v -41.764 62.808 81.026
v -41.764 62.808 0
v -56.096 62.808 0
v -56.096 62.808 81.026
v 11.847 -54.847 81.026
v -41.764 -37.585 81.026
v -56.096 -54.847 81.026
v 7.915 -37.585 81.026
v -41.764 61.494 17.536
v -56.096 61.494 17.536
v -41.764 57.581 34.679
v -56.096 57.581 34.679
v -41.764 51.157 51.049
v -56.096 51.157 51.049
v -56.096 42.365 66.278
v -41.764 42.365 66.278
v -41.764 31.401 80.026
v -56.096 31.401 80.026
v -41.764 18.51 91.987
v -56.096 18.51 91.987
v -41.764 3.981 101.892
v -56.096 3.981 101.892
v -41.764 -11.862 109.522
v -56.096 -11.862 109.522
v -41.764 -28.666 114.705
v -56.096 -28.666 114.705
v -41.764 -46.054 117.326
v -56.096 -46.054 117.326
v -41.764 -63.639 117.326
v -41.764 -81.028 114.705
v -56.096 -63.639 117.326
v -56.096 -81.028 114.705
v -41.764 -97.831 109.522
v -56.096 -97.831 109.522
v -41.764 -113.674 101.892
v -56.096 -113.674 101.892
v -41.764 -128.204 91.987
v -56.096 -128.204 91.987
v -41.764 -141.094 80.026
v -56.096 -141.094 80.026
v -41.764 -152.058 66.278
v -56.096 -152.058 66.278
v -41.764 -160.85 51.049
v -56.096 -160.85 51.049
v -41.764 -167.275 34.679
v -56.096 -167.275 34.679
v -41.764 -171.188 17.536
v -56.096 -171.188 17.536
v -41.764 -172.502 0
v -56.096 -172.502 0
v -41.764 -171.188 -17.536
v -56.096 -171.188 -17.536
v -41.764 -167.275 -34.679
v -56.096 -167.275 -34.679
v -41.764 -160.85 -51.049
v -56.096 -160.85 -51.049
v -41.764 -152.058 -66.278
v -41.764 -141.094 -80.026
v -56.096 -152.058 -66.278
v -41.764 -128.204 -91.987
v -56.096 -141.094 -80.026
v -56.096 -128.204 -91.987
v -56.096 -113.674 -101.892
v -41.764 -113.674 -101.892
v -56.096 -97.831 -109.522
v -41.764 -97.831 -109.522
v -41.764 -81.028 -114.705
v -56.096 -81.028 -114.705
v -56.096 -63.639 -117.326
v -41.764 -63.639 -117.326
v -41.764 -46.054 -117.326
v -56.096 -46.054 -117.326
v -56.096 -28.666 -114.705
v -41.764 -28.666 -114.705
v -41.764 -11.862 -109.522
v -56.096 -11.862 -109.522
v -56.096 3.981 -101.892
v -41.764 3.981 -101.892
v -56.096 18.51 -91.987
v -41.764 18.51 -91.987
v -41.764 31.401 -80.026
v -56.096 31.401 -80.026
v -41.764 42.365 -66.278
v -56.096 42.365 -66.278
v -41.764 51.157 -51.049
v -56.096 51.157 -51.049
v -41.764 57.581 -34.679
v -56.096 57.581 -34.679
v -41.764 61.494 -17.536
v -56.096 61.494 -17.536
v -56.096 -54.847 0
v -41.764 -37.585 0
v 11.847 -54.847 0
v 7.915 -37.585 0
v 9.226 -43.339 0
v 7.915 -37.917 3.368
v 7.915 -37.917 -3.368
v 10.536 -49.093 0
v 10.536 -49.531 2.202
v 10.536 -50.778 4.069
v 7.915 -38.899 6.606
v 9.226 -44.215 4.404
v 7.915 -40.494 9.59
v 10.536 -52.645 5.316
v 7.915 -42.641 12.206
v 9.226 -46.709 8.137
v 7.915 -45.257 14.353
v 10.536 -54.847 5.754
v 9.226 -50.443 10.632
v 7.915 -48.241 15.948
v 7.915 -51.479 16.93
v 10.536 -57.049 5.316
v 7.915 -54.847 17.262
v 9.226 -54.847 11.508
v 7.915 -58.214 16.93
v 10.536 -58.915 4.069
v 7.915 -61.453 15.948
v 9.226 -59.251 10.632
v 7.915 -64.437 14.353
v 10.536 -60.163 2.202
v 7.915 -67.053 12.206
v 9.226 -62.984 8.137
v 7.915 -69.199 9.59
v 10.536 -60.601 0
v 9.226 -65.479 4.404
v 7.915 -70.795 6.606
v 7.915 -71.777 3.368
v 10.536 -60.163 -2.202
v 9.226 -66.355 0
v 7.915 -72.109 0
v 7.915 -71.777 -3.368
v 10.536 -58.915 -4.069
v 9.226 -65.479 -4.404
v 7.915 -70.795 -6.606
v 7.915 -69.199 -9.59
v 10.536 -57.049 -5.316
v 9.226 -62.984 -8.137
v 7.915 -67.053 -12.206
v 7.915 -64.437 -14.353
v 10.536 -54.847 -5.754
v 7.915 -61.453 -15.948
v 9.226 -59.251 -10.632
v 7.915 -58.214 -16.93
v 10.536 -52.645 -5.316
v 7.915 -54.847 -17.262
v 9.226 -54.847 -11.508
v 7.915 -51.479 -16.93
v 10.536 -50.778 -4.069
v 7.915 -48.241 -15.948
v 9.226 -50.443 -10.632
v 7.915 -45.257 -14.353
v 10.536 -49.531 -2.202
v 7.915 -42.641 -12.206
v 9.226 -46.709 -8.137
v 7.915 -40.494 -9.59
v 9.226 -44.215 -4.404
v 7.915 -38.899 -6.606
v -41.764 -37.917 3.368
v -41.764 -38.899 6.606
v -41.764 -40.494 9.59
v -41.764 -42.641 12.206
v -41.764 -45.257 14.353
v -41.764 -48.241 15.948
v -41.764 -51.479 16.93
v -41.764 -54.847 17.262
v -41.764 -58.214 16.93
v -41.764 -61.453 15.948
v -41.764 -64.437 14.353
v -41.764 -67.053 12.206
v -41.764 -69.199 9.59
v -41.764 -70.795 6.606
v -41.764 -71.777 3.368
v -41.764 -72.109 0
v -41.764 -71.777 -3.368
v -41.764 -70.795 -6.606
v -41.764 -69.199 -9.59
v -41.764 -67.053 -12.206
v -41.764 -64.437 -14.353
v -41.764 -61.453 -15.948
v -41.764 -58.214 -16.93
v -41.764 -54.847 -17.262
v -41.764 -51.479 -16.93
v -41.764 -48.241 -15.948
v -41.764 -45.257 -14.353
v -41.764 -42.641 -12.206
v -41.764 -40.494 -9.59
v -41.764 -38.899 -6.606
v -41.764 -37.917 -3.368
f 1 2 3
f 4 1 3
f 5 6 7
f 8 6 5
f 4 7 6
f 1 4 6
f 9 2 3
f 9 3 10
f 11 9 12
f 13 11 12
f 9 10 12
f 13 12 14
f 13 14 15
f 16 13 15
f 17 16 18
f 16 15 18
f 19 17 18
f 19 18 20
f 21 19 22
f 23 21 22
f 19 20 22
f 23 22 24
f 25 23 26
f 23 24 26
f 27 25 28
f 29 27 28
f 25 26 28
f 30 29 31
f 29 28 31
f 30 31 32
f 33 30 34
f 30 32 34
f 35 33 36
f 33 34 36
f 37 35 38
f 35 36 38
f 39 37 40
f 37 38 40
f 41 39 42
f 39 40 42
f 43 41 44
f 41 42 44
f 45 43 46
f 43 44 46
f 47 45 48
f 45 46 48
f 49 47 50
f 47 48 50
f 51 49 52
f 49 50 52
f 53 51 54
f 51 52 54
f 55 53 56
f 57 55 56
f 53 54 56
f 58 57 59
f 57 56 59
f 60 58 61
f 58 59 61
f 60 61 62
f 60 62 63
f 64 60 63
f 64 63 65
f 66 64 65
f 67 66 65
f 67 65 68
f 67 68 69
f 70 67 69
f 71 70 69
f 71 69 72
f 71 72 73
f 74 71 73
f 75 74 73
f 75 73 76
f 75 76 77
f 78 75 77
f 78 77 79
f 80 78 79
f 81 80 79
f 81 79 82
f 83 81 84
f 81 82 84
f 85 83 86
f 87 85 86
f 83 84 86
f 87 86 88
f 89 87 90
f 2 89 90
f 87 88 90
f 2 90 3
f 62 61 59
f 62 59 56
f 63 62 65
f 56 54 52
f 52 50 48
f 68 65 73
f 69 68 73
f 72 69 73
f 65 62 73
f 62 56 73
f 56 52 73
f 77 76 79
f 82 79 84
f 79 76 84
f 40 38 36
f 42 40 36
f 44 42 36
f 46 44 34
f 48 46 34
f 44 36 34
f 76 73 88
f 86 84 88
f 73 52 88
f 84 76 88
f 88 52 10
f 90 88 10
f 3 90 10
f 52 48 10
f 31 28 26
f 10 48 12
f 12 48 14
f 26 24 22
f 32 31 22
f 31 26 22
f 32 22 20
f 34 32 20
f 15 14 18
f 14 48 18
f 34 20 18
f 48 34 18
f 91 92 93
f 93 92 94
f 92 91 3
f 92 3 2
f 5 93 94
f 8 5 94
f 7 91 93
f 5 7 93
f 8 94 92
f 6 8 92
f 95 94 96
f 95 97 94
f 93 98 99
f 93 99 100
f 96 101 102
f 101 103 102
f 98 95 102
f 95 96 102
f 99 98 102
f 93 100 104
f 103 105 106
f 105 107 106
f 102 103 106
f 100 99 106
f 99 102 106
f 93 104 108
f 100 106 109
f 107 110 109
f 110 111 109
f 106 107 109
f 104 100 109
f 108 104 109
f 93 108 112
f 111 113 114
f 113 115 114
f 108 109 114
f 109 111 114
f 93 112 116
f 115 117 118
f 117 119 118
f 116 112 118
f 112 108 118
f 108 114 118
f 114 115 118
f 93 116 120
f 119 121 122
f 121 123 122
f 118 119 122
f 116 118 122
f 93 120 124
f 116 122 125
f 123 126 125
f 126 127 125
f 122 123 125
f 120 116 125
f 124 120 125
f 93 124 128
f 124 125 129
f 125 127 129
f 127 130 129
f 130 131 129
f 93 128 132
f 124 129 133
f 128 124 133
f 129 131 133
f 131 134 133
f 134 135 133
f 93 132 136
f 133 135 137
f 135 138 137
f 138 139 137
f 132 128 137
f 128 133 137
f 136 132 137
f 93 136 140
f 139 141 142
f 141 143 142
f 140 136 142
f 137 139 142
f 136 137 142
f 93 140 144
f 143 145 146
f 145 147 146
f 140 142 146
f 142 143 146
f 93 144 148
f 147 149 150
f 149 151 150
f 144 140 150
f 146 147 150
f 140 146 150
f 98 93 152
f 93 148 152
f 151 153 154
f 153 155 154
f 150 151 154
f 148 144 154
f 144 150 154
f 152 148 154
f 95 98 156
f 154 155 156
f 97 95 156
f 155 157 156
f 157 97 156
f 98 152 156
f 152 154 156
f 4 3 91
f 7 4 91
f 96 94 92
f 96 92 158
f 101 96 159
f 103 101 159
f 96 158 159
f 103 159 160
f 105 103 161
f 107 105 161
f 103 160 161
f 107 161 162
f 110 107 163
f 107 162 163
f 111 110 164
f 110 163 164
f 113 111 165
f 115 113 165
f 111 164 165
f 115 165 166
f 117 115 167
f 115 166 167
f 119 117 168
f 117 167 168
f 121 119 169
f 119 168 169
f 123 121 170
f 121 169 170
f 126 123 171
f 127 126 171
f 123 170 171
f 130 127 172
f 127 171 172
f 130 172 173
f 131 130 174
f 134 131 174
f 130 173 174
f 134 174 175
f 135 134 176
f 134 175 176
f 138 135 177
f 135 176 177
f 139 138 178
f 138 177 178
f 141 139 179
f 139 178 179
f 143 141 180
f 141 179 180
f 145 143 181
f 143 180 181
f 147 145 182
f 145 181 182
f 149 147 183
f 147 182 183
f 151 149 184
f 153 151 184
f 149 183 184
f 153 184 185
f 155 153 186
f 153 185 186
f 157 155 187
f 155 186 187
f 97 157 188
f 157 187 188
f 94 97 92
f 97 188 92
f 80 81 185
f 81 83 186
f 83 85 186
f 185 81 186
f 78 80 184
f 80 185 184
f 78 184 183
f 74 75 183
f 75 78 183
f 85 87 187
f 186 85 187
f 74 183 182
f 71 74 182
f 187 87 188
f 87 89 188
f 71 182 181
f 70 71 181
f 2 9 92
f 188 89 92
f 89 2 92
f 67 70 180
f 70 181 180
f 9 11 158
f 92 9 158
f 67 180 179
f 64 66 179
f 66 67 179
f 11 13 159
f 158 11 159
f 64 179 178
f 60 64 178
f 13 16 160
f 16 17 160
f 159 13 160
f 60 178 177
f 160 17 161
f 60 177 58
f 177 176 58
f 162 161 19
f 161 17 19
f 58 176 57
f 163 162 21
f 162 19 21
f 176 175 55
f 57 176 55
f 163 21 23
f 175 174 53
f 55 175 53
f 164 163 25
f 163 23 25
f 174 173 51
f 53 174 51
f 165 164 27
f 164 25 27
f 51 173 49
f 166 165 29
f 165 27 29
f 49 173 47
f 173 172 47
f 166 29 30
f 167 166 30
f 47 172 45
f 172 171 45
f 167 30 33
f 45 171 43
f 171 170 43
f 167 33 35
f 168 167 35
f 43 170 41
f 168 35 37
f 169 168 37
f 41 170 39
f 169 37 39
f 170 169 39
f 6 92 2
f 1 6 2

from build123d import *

# Parameters (mm, degrees)
F1_DEPTH = 81.026


with BuildPart() as f1:
    # F0 (on Top) → F1 (new body)
    with BuildSketch(Plane.XY):
        Polygon((-41.76428, 62.808446), (-56.09592, 62.808446), (-56.09592, -54.846772), (11.84716, -54.846772), (7.914797, -37.584991), (-41.76428, -37.584991), align=None)
    extrude(amount=F1_DEPTH)


with BuildPart() as f2:
    # F0 (on Top) → F2 (revolve)
    with BuildSketch(Plane.XY):
        Polygon((-41.76428, 62.808446), (-56.09592, 62.808446), (-56.09592, -54.846772), (11.84716, -54.846772), (7.914797, -37.584991), (-41.76428, -37.584991), align=None)
    revolve(axis=Axis((-22.12438, -54.846772, 0), (1, 0, 0)))


solid = Compound([f1.part, f2.part])
